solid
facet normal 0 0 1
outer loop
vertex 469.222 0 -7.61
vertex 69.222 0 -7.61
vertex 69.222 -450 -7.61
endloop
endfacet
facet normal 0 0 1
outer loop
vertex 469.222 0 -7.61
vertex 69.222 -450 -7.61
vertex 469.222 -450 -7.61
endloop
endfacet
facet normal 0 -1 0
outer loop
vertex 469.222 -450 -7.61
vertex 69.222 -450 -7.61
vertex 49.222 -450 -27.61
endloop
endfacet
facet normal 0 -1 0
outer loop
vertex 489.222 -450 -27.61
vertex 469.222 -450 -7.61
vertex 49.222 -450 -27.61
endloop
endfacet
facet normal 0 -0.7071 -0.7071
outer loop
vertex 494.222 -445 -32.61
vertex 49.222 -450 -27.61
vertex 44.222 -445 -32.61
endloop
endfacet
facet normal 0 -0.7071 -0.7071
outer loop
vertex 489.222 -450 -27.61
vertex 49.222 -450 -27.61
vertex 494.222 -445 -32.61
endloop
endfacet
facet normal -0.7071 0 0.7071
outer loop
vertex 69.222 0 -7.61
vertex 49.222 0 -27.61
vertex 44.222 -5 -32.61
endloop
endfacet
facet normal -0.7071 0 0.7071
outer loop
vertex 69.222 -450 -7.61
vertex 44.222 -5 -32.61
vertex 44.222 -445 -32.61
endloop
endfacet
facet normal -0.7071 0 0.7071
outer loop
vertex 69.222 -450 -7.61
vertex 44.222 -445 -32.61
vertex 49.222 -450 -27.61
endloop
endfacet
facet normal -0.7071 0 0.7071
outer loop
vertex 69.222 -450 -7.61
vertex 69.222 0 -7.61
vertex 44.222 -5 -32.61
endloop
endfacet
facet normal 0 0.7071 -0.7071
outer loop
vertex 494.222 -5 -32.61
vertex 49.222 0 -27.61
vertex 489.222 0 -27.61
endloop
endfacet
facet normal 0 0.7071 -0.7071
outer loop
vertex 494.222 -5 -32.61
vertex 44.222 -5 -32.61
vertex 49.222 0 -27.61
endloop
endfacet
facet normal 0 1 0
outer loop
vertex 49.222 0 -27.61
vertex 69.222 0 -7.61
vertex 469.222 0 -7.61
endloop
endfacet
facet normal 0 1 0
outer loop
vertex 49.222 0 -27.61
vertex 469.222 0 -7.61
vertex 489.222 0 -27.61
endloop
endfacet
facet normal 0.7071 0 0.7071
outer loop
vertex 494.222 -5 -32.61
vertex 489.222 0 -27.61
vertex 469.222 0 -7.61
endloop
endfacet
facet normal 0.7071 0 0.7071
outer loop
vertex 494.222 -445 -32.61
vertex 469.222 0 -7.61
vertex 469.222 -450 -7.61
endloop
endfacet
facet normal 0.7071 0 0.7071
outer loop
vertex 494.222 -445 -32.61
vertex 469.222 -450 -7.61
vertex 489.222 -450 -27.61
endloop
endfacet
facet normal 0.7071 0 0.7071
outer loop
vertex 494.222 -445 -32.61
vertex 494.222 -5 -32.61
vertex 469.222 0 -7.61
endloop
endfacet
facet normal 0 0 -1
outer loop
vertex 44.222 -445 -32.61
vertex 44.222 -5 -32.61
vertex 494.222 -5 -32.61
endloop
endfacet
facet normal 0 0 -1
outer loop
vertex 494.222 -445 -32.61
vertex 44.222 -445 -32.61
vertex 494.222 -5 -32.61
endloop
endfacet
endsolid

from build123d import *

# Parameters (mm, degrees)
F0_W     = 450
F0_H     = 25
F1_DEPTH = 450
F2_SIZE  = 24.99999
F3_SIZE  = 24.99999
F4_SIZE  = 5


# Not quite as in the source:
# - a fillet or chamfer is up to 0.001 mm smaller than in the source, because OpenCascade refuses the exact size


with BuildPart() as f1:
    # F0 (on Front) → F1 (new body)
    with BuildSketch(Plane.XZ):
        with Locations((269.2221287504, -20.1100035338)):
            Rectangle(F0_W, F0_H)
    extrude(amount=F1_DEPTH)

    # F2 (size 25 in the source; OpenCascade refuses exactly that, so slightly less here)
    f2_edges = [f1.edges().sort_by_distance(p)[0] for p in [
        (44.222129, -225, -7.610004),
    ]]
    chamfer(f2_edges, length=F2_SIZE)

    # F3 (size 25 in the source; OpenCascade refuses exactly that, so slightly less here)
    f3_edges = [f1.edges().sort_by_distance(p)[0] for p in [
        (494.222129, -225, -7.610004),
    ]]
    chamfer(f3_edges, length=F3_SIZE)

    # F4
    f4_edges = [f1.edges().sort_by_distance(p)[0] for p in [
        (269.222129, -450, -32.610004),
        (269.222129, 0, -32.610004),
    ]]
    chamfer(f4_edges, length=F4_SIZE)


solid = f1.part
